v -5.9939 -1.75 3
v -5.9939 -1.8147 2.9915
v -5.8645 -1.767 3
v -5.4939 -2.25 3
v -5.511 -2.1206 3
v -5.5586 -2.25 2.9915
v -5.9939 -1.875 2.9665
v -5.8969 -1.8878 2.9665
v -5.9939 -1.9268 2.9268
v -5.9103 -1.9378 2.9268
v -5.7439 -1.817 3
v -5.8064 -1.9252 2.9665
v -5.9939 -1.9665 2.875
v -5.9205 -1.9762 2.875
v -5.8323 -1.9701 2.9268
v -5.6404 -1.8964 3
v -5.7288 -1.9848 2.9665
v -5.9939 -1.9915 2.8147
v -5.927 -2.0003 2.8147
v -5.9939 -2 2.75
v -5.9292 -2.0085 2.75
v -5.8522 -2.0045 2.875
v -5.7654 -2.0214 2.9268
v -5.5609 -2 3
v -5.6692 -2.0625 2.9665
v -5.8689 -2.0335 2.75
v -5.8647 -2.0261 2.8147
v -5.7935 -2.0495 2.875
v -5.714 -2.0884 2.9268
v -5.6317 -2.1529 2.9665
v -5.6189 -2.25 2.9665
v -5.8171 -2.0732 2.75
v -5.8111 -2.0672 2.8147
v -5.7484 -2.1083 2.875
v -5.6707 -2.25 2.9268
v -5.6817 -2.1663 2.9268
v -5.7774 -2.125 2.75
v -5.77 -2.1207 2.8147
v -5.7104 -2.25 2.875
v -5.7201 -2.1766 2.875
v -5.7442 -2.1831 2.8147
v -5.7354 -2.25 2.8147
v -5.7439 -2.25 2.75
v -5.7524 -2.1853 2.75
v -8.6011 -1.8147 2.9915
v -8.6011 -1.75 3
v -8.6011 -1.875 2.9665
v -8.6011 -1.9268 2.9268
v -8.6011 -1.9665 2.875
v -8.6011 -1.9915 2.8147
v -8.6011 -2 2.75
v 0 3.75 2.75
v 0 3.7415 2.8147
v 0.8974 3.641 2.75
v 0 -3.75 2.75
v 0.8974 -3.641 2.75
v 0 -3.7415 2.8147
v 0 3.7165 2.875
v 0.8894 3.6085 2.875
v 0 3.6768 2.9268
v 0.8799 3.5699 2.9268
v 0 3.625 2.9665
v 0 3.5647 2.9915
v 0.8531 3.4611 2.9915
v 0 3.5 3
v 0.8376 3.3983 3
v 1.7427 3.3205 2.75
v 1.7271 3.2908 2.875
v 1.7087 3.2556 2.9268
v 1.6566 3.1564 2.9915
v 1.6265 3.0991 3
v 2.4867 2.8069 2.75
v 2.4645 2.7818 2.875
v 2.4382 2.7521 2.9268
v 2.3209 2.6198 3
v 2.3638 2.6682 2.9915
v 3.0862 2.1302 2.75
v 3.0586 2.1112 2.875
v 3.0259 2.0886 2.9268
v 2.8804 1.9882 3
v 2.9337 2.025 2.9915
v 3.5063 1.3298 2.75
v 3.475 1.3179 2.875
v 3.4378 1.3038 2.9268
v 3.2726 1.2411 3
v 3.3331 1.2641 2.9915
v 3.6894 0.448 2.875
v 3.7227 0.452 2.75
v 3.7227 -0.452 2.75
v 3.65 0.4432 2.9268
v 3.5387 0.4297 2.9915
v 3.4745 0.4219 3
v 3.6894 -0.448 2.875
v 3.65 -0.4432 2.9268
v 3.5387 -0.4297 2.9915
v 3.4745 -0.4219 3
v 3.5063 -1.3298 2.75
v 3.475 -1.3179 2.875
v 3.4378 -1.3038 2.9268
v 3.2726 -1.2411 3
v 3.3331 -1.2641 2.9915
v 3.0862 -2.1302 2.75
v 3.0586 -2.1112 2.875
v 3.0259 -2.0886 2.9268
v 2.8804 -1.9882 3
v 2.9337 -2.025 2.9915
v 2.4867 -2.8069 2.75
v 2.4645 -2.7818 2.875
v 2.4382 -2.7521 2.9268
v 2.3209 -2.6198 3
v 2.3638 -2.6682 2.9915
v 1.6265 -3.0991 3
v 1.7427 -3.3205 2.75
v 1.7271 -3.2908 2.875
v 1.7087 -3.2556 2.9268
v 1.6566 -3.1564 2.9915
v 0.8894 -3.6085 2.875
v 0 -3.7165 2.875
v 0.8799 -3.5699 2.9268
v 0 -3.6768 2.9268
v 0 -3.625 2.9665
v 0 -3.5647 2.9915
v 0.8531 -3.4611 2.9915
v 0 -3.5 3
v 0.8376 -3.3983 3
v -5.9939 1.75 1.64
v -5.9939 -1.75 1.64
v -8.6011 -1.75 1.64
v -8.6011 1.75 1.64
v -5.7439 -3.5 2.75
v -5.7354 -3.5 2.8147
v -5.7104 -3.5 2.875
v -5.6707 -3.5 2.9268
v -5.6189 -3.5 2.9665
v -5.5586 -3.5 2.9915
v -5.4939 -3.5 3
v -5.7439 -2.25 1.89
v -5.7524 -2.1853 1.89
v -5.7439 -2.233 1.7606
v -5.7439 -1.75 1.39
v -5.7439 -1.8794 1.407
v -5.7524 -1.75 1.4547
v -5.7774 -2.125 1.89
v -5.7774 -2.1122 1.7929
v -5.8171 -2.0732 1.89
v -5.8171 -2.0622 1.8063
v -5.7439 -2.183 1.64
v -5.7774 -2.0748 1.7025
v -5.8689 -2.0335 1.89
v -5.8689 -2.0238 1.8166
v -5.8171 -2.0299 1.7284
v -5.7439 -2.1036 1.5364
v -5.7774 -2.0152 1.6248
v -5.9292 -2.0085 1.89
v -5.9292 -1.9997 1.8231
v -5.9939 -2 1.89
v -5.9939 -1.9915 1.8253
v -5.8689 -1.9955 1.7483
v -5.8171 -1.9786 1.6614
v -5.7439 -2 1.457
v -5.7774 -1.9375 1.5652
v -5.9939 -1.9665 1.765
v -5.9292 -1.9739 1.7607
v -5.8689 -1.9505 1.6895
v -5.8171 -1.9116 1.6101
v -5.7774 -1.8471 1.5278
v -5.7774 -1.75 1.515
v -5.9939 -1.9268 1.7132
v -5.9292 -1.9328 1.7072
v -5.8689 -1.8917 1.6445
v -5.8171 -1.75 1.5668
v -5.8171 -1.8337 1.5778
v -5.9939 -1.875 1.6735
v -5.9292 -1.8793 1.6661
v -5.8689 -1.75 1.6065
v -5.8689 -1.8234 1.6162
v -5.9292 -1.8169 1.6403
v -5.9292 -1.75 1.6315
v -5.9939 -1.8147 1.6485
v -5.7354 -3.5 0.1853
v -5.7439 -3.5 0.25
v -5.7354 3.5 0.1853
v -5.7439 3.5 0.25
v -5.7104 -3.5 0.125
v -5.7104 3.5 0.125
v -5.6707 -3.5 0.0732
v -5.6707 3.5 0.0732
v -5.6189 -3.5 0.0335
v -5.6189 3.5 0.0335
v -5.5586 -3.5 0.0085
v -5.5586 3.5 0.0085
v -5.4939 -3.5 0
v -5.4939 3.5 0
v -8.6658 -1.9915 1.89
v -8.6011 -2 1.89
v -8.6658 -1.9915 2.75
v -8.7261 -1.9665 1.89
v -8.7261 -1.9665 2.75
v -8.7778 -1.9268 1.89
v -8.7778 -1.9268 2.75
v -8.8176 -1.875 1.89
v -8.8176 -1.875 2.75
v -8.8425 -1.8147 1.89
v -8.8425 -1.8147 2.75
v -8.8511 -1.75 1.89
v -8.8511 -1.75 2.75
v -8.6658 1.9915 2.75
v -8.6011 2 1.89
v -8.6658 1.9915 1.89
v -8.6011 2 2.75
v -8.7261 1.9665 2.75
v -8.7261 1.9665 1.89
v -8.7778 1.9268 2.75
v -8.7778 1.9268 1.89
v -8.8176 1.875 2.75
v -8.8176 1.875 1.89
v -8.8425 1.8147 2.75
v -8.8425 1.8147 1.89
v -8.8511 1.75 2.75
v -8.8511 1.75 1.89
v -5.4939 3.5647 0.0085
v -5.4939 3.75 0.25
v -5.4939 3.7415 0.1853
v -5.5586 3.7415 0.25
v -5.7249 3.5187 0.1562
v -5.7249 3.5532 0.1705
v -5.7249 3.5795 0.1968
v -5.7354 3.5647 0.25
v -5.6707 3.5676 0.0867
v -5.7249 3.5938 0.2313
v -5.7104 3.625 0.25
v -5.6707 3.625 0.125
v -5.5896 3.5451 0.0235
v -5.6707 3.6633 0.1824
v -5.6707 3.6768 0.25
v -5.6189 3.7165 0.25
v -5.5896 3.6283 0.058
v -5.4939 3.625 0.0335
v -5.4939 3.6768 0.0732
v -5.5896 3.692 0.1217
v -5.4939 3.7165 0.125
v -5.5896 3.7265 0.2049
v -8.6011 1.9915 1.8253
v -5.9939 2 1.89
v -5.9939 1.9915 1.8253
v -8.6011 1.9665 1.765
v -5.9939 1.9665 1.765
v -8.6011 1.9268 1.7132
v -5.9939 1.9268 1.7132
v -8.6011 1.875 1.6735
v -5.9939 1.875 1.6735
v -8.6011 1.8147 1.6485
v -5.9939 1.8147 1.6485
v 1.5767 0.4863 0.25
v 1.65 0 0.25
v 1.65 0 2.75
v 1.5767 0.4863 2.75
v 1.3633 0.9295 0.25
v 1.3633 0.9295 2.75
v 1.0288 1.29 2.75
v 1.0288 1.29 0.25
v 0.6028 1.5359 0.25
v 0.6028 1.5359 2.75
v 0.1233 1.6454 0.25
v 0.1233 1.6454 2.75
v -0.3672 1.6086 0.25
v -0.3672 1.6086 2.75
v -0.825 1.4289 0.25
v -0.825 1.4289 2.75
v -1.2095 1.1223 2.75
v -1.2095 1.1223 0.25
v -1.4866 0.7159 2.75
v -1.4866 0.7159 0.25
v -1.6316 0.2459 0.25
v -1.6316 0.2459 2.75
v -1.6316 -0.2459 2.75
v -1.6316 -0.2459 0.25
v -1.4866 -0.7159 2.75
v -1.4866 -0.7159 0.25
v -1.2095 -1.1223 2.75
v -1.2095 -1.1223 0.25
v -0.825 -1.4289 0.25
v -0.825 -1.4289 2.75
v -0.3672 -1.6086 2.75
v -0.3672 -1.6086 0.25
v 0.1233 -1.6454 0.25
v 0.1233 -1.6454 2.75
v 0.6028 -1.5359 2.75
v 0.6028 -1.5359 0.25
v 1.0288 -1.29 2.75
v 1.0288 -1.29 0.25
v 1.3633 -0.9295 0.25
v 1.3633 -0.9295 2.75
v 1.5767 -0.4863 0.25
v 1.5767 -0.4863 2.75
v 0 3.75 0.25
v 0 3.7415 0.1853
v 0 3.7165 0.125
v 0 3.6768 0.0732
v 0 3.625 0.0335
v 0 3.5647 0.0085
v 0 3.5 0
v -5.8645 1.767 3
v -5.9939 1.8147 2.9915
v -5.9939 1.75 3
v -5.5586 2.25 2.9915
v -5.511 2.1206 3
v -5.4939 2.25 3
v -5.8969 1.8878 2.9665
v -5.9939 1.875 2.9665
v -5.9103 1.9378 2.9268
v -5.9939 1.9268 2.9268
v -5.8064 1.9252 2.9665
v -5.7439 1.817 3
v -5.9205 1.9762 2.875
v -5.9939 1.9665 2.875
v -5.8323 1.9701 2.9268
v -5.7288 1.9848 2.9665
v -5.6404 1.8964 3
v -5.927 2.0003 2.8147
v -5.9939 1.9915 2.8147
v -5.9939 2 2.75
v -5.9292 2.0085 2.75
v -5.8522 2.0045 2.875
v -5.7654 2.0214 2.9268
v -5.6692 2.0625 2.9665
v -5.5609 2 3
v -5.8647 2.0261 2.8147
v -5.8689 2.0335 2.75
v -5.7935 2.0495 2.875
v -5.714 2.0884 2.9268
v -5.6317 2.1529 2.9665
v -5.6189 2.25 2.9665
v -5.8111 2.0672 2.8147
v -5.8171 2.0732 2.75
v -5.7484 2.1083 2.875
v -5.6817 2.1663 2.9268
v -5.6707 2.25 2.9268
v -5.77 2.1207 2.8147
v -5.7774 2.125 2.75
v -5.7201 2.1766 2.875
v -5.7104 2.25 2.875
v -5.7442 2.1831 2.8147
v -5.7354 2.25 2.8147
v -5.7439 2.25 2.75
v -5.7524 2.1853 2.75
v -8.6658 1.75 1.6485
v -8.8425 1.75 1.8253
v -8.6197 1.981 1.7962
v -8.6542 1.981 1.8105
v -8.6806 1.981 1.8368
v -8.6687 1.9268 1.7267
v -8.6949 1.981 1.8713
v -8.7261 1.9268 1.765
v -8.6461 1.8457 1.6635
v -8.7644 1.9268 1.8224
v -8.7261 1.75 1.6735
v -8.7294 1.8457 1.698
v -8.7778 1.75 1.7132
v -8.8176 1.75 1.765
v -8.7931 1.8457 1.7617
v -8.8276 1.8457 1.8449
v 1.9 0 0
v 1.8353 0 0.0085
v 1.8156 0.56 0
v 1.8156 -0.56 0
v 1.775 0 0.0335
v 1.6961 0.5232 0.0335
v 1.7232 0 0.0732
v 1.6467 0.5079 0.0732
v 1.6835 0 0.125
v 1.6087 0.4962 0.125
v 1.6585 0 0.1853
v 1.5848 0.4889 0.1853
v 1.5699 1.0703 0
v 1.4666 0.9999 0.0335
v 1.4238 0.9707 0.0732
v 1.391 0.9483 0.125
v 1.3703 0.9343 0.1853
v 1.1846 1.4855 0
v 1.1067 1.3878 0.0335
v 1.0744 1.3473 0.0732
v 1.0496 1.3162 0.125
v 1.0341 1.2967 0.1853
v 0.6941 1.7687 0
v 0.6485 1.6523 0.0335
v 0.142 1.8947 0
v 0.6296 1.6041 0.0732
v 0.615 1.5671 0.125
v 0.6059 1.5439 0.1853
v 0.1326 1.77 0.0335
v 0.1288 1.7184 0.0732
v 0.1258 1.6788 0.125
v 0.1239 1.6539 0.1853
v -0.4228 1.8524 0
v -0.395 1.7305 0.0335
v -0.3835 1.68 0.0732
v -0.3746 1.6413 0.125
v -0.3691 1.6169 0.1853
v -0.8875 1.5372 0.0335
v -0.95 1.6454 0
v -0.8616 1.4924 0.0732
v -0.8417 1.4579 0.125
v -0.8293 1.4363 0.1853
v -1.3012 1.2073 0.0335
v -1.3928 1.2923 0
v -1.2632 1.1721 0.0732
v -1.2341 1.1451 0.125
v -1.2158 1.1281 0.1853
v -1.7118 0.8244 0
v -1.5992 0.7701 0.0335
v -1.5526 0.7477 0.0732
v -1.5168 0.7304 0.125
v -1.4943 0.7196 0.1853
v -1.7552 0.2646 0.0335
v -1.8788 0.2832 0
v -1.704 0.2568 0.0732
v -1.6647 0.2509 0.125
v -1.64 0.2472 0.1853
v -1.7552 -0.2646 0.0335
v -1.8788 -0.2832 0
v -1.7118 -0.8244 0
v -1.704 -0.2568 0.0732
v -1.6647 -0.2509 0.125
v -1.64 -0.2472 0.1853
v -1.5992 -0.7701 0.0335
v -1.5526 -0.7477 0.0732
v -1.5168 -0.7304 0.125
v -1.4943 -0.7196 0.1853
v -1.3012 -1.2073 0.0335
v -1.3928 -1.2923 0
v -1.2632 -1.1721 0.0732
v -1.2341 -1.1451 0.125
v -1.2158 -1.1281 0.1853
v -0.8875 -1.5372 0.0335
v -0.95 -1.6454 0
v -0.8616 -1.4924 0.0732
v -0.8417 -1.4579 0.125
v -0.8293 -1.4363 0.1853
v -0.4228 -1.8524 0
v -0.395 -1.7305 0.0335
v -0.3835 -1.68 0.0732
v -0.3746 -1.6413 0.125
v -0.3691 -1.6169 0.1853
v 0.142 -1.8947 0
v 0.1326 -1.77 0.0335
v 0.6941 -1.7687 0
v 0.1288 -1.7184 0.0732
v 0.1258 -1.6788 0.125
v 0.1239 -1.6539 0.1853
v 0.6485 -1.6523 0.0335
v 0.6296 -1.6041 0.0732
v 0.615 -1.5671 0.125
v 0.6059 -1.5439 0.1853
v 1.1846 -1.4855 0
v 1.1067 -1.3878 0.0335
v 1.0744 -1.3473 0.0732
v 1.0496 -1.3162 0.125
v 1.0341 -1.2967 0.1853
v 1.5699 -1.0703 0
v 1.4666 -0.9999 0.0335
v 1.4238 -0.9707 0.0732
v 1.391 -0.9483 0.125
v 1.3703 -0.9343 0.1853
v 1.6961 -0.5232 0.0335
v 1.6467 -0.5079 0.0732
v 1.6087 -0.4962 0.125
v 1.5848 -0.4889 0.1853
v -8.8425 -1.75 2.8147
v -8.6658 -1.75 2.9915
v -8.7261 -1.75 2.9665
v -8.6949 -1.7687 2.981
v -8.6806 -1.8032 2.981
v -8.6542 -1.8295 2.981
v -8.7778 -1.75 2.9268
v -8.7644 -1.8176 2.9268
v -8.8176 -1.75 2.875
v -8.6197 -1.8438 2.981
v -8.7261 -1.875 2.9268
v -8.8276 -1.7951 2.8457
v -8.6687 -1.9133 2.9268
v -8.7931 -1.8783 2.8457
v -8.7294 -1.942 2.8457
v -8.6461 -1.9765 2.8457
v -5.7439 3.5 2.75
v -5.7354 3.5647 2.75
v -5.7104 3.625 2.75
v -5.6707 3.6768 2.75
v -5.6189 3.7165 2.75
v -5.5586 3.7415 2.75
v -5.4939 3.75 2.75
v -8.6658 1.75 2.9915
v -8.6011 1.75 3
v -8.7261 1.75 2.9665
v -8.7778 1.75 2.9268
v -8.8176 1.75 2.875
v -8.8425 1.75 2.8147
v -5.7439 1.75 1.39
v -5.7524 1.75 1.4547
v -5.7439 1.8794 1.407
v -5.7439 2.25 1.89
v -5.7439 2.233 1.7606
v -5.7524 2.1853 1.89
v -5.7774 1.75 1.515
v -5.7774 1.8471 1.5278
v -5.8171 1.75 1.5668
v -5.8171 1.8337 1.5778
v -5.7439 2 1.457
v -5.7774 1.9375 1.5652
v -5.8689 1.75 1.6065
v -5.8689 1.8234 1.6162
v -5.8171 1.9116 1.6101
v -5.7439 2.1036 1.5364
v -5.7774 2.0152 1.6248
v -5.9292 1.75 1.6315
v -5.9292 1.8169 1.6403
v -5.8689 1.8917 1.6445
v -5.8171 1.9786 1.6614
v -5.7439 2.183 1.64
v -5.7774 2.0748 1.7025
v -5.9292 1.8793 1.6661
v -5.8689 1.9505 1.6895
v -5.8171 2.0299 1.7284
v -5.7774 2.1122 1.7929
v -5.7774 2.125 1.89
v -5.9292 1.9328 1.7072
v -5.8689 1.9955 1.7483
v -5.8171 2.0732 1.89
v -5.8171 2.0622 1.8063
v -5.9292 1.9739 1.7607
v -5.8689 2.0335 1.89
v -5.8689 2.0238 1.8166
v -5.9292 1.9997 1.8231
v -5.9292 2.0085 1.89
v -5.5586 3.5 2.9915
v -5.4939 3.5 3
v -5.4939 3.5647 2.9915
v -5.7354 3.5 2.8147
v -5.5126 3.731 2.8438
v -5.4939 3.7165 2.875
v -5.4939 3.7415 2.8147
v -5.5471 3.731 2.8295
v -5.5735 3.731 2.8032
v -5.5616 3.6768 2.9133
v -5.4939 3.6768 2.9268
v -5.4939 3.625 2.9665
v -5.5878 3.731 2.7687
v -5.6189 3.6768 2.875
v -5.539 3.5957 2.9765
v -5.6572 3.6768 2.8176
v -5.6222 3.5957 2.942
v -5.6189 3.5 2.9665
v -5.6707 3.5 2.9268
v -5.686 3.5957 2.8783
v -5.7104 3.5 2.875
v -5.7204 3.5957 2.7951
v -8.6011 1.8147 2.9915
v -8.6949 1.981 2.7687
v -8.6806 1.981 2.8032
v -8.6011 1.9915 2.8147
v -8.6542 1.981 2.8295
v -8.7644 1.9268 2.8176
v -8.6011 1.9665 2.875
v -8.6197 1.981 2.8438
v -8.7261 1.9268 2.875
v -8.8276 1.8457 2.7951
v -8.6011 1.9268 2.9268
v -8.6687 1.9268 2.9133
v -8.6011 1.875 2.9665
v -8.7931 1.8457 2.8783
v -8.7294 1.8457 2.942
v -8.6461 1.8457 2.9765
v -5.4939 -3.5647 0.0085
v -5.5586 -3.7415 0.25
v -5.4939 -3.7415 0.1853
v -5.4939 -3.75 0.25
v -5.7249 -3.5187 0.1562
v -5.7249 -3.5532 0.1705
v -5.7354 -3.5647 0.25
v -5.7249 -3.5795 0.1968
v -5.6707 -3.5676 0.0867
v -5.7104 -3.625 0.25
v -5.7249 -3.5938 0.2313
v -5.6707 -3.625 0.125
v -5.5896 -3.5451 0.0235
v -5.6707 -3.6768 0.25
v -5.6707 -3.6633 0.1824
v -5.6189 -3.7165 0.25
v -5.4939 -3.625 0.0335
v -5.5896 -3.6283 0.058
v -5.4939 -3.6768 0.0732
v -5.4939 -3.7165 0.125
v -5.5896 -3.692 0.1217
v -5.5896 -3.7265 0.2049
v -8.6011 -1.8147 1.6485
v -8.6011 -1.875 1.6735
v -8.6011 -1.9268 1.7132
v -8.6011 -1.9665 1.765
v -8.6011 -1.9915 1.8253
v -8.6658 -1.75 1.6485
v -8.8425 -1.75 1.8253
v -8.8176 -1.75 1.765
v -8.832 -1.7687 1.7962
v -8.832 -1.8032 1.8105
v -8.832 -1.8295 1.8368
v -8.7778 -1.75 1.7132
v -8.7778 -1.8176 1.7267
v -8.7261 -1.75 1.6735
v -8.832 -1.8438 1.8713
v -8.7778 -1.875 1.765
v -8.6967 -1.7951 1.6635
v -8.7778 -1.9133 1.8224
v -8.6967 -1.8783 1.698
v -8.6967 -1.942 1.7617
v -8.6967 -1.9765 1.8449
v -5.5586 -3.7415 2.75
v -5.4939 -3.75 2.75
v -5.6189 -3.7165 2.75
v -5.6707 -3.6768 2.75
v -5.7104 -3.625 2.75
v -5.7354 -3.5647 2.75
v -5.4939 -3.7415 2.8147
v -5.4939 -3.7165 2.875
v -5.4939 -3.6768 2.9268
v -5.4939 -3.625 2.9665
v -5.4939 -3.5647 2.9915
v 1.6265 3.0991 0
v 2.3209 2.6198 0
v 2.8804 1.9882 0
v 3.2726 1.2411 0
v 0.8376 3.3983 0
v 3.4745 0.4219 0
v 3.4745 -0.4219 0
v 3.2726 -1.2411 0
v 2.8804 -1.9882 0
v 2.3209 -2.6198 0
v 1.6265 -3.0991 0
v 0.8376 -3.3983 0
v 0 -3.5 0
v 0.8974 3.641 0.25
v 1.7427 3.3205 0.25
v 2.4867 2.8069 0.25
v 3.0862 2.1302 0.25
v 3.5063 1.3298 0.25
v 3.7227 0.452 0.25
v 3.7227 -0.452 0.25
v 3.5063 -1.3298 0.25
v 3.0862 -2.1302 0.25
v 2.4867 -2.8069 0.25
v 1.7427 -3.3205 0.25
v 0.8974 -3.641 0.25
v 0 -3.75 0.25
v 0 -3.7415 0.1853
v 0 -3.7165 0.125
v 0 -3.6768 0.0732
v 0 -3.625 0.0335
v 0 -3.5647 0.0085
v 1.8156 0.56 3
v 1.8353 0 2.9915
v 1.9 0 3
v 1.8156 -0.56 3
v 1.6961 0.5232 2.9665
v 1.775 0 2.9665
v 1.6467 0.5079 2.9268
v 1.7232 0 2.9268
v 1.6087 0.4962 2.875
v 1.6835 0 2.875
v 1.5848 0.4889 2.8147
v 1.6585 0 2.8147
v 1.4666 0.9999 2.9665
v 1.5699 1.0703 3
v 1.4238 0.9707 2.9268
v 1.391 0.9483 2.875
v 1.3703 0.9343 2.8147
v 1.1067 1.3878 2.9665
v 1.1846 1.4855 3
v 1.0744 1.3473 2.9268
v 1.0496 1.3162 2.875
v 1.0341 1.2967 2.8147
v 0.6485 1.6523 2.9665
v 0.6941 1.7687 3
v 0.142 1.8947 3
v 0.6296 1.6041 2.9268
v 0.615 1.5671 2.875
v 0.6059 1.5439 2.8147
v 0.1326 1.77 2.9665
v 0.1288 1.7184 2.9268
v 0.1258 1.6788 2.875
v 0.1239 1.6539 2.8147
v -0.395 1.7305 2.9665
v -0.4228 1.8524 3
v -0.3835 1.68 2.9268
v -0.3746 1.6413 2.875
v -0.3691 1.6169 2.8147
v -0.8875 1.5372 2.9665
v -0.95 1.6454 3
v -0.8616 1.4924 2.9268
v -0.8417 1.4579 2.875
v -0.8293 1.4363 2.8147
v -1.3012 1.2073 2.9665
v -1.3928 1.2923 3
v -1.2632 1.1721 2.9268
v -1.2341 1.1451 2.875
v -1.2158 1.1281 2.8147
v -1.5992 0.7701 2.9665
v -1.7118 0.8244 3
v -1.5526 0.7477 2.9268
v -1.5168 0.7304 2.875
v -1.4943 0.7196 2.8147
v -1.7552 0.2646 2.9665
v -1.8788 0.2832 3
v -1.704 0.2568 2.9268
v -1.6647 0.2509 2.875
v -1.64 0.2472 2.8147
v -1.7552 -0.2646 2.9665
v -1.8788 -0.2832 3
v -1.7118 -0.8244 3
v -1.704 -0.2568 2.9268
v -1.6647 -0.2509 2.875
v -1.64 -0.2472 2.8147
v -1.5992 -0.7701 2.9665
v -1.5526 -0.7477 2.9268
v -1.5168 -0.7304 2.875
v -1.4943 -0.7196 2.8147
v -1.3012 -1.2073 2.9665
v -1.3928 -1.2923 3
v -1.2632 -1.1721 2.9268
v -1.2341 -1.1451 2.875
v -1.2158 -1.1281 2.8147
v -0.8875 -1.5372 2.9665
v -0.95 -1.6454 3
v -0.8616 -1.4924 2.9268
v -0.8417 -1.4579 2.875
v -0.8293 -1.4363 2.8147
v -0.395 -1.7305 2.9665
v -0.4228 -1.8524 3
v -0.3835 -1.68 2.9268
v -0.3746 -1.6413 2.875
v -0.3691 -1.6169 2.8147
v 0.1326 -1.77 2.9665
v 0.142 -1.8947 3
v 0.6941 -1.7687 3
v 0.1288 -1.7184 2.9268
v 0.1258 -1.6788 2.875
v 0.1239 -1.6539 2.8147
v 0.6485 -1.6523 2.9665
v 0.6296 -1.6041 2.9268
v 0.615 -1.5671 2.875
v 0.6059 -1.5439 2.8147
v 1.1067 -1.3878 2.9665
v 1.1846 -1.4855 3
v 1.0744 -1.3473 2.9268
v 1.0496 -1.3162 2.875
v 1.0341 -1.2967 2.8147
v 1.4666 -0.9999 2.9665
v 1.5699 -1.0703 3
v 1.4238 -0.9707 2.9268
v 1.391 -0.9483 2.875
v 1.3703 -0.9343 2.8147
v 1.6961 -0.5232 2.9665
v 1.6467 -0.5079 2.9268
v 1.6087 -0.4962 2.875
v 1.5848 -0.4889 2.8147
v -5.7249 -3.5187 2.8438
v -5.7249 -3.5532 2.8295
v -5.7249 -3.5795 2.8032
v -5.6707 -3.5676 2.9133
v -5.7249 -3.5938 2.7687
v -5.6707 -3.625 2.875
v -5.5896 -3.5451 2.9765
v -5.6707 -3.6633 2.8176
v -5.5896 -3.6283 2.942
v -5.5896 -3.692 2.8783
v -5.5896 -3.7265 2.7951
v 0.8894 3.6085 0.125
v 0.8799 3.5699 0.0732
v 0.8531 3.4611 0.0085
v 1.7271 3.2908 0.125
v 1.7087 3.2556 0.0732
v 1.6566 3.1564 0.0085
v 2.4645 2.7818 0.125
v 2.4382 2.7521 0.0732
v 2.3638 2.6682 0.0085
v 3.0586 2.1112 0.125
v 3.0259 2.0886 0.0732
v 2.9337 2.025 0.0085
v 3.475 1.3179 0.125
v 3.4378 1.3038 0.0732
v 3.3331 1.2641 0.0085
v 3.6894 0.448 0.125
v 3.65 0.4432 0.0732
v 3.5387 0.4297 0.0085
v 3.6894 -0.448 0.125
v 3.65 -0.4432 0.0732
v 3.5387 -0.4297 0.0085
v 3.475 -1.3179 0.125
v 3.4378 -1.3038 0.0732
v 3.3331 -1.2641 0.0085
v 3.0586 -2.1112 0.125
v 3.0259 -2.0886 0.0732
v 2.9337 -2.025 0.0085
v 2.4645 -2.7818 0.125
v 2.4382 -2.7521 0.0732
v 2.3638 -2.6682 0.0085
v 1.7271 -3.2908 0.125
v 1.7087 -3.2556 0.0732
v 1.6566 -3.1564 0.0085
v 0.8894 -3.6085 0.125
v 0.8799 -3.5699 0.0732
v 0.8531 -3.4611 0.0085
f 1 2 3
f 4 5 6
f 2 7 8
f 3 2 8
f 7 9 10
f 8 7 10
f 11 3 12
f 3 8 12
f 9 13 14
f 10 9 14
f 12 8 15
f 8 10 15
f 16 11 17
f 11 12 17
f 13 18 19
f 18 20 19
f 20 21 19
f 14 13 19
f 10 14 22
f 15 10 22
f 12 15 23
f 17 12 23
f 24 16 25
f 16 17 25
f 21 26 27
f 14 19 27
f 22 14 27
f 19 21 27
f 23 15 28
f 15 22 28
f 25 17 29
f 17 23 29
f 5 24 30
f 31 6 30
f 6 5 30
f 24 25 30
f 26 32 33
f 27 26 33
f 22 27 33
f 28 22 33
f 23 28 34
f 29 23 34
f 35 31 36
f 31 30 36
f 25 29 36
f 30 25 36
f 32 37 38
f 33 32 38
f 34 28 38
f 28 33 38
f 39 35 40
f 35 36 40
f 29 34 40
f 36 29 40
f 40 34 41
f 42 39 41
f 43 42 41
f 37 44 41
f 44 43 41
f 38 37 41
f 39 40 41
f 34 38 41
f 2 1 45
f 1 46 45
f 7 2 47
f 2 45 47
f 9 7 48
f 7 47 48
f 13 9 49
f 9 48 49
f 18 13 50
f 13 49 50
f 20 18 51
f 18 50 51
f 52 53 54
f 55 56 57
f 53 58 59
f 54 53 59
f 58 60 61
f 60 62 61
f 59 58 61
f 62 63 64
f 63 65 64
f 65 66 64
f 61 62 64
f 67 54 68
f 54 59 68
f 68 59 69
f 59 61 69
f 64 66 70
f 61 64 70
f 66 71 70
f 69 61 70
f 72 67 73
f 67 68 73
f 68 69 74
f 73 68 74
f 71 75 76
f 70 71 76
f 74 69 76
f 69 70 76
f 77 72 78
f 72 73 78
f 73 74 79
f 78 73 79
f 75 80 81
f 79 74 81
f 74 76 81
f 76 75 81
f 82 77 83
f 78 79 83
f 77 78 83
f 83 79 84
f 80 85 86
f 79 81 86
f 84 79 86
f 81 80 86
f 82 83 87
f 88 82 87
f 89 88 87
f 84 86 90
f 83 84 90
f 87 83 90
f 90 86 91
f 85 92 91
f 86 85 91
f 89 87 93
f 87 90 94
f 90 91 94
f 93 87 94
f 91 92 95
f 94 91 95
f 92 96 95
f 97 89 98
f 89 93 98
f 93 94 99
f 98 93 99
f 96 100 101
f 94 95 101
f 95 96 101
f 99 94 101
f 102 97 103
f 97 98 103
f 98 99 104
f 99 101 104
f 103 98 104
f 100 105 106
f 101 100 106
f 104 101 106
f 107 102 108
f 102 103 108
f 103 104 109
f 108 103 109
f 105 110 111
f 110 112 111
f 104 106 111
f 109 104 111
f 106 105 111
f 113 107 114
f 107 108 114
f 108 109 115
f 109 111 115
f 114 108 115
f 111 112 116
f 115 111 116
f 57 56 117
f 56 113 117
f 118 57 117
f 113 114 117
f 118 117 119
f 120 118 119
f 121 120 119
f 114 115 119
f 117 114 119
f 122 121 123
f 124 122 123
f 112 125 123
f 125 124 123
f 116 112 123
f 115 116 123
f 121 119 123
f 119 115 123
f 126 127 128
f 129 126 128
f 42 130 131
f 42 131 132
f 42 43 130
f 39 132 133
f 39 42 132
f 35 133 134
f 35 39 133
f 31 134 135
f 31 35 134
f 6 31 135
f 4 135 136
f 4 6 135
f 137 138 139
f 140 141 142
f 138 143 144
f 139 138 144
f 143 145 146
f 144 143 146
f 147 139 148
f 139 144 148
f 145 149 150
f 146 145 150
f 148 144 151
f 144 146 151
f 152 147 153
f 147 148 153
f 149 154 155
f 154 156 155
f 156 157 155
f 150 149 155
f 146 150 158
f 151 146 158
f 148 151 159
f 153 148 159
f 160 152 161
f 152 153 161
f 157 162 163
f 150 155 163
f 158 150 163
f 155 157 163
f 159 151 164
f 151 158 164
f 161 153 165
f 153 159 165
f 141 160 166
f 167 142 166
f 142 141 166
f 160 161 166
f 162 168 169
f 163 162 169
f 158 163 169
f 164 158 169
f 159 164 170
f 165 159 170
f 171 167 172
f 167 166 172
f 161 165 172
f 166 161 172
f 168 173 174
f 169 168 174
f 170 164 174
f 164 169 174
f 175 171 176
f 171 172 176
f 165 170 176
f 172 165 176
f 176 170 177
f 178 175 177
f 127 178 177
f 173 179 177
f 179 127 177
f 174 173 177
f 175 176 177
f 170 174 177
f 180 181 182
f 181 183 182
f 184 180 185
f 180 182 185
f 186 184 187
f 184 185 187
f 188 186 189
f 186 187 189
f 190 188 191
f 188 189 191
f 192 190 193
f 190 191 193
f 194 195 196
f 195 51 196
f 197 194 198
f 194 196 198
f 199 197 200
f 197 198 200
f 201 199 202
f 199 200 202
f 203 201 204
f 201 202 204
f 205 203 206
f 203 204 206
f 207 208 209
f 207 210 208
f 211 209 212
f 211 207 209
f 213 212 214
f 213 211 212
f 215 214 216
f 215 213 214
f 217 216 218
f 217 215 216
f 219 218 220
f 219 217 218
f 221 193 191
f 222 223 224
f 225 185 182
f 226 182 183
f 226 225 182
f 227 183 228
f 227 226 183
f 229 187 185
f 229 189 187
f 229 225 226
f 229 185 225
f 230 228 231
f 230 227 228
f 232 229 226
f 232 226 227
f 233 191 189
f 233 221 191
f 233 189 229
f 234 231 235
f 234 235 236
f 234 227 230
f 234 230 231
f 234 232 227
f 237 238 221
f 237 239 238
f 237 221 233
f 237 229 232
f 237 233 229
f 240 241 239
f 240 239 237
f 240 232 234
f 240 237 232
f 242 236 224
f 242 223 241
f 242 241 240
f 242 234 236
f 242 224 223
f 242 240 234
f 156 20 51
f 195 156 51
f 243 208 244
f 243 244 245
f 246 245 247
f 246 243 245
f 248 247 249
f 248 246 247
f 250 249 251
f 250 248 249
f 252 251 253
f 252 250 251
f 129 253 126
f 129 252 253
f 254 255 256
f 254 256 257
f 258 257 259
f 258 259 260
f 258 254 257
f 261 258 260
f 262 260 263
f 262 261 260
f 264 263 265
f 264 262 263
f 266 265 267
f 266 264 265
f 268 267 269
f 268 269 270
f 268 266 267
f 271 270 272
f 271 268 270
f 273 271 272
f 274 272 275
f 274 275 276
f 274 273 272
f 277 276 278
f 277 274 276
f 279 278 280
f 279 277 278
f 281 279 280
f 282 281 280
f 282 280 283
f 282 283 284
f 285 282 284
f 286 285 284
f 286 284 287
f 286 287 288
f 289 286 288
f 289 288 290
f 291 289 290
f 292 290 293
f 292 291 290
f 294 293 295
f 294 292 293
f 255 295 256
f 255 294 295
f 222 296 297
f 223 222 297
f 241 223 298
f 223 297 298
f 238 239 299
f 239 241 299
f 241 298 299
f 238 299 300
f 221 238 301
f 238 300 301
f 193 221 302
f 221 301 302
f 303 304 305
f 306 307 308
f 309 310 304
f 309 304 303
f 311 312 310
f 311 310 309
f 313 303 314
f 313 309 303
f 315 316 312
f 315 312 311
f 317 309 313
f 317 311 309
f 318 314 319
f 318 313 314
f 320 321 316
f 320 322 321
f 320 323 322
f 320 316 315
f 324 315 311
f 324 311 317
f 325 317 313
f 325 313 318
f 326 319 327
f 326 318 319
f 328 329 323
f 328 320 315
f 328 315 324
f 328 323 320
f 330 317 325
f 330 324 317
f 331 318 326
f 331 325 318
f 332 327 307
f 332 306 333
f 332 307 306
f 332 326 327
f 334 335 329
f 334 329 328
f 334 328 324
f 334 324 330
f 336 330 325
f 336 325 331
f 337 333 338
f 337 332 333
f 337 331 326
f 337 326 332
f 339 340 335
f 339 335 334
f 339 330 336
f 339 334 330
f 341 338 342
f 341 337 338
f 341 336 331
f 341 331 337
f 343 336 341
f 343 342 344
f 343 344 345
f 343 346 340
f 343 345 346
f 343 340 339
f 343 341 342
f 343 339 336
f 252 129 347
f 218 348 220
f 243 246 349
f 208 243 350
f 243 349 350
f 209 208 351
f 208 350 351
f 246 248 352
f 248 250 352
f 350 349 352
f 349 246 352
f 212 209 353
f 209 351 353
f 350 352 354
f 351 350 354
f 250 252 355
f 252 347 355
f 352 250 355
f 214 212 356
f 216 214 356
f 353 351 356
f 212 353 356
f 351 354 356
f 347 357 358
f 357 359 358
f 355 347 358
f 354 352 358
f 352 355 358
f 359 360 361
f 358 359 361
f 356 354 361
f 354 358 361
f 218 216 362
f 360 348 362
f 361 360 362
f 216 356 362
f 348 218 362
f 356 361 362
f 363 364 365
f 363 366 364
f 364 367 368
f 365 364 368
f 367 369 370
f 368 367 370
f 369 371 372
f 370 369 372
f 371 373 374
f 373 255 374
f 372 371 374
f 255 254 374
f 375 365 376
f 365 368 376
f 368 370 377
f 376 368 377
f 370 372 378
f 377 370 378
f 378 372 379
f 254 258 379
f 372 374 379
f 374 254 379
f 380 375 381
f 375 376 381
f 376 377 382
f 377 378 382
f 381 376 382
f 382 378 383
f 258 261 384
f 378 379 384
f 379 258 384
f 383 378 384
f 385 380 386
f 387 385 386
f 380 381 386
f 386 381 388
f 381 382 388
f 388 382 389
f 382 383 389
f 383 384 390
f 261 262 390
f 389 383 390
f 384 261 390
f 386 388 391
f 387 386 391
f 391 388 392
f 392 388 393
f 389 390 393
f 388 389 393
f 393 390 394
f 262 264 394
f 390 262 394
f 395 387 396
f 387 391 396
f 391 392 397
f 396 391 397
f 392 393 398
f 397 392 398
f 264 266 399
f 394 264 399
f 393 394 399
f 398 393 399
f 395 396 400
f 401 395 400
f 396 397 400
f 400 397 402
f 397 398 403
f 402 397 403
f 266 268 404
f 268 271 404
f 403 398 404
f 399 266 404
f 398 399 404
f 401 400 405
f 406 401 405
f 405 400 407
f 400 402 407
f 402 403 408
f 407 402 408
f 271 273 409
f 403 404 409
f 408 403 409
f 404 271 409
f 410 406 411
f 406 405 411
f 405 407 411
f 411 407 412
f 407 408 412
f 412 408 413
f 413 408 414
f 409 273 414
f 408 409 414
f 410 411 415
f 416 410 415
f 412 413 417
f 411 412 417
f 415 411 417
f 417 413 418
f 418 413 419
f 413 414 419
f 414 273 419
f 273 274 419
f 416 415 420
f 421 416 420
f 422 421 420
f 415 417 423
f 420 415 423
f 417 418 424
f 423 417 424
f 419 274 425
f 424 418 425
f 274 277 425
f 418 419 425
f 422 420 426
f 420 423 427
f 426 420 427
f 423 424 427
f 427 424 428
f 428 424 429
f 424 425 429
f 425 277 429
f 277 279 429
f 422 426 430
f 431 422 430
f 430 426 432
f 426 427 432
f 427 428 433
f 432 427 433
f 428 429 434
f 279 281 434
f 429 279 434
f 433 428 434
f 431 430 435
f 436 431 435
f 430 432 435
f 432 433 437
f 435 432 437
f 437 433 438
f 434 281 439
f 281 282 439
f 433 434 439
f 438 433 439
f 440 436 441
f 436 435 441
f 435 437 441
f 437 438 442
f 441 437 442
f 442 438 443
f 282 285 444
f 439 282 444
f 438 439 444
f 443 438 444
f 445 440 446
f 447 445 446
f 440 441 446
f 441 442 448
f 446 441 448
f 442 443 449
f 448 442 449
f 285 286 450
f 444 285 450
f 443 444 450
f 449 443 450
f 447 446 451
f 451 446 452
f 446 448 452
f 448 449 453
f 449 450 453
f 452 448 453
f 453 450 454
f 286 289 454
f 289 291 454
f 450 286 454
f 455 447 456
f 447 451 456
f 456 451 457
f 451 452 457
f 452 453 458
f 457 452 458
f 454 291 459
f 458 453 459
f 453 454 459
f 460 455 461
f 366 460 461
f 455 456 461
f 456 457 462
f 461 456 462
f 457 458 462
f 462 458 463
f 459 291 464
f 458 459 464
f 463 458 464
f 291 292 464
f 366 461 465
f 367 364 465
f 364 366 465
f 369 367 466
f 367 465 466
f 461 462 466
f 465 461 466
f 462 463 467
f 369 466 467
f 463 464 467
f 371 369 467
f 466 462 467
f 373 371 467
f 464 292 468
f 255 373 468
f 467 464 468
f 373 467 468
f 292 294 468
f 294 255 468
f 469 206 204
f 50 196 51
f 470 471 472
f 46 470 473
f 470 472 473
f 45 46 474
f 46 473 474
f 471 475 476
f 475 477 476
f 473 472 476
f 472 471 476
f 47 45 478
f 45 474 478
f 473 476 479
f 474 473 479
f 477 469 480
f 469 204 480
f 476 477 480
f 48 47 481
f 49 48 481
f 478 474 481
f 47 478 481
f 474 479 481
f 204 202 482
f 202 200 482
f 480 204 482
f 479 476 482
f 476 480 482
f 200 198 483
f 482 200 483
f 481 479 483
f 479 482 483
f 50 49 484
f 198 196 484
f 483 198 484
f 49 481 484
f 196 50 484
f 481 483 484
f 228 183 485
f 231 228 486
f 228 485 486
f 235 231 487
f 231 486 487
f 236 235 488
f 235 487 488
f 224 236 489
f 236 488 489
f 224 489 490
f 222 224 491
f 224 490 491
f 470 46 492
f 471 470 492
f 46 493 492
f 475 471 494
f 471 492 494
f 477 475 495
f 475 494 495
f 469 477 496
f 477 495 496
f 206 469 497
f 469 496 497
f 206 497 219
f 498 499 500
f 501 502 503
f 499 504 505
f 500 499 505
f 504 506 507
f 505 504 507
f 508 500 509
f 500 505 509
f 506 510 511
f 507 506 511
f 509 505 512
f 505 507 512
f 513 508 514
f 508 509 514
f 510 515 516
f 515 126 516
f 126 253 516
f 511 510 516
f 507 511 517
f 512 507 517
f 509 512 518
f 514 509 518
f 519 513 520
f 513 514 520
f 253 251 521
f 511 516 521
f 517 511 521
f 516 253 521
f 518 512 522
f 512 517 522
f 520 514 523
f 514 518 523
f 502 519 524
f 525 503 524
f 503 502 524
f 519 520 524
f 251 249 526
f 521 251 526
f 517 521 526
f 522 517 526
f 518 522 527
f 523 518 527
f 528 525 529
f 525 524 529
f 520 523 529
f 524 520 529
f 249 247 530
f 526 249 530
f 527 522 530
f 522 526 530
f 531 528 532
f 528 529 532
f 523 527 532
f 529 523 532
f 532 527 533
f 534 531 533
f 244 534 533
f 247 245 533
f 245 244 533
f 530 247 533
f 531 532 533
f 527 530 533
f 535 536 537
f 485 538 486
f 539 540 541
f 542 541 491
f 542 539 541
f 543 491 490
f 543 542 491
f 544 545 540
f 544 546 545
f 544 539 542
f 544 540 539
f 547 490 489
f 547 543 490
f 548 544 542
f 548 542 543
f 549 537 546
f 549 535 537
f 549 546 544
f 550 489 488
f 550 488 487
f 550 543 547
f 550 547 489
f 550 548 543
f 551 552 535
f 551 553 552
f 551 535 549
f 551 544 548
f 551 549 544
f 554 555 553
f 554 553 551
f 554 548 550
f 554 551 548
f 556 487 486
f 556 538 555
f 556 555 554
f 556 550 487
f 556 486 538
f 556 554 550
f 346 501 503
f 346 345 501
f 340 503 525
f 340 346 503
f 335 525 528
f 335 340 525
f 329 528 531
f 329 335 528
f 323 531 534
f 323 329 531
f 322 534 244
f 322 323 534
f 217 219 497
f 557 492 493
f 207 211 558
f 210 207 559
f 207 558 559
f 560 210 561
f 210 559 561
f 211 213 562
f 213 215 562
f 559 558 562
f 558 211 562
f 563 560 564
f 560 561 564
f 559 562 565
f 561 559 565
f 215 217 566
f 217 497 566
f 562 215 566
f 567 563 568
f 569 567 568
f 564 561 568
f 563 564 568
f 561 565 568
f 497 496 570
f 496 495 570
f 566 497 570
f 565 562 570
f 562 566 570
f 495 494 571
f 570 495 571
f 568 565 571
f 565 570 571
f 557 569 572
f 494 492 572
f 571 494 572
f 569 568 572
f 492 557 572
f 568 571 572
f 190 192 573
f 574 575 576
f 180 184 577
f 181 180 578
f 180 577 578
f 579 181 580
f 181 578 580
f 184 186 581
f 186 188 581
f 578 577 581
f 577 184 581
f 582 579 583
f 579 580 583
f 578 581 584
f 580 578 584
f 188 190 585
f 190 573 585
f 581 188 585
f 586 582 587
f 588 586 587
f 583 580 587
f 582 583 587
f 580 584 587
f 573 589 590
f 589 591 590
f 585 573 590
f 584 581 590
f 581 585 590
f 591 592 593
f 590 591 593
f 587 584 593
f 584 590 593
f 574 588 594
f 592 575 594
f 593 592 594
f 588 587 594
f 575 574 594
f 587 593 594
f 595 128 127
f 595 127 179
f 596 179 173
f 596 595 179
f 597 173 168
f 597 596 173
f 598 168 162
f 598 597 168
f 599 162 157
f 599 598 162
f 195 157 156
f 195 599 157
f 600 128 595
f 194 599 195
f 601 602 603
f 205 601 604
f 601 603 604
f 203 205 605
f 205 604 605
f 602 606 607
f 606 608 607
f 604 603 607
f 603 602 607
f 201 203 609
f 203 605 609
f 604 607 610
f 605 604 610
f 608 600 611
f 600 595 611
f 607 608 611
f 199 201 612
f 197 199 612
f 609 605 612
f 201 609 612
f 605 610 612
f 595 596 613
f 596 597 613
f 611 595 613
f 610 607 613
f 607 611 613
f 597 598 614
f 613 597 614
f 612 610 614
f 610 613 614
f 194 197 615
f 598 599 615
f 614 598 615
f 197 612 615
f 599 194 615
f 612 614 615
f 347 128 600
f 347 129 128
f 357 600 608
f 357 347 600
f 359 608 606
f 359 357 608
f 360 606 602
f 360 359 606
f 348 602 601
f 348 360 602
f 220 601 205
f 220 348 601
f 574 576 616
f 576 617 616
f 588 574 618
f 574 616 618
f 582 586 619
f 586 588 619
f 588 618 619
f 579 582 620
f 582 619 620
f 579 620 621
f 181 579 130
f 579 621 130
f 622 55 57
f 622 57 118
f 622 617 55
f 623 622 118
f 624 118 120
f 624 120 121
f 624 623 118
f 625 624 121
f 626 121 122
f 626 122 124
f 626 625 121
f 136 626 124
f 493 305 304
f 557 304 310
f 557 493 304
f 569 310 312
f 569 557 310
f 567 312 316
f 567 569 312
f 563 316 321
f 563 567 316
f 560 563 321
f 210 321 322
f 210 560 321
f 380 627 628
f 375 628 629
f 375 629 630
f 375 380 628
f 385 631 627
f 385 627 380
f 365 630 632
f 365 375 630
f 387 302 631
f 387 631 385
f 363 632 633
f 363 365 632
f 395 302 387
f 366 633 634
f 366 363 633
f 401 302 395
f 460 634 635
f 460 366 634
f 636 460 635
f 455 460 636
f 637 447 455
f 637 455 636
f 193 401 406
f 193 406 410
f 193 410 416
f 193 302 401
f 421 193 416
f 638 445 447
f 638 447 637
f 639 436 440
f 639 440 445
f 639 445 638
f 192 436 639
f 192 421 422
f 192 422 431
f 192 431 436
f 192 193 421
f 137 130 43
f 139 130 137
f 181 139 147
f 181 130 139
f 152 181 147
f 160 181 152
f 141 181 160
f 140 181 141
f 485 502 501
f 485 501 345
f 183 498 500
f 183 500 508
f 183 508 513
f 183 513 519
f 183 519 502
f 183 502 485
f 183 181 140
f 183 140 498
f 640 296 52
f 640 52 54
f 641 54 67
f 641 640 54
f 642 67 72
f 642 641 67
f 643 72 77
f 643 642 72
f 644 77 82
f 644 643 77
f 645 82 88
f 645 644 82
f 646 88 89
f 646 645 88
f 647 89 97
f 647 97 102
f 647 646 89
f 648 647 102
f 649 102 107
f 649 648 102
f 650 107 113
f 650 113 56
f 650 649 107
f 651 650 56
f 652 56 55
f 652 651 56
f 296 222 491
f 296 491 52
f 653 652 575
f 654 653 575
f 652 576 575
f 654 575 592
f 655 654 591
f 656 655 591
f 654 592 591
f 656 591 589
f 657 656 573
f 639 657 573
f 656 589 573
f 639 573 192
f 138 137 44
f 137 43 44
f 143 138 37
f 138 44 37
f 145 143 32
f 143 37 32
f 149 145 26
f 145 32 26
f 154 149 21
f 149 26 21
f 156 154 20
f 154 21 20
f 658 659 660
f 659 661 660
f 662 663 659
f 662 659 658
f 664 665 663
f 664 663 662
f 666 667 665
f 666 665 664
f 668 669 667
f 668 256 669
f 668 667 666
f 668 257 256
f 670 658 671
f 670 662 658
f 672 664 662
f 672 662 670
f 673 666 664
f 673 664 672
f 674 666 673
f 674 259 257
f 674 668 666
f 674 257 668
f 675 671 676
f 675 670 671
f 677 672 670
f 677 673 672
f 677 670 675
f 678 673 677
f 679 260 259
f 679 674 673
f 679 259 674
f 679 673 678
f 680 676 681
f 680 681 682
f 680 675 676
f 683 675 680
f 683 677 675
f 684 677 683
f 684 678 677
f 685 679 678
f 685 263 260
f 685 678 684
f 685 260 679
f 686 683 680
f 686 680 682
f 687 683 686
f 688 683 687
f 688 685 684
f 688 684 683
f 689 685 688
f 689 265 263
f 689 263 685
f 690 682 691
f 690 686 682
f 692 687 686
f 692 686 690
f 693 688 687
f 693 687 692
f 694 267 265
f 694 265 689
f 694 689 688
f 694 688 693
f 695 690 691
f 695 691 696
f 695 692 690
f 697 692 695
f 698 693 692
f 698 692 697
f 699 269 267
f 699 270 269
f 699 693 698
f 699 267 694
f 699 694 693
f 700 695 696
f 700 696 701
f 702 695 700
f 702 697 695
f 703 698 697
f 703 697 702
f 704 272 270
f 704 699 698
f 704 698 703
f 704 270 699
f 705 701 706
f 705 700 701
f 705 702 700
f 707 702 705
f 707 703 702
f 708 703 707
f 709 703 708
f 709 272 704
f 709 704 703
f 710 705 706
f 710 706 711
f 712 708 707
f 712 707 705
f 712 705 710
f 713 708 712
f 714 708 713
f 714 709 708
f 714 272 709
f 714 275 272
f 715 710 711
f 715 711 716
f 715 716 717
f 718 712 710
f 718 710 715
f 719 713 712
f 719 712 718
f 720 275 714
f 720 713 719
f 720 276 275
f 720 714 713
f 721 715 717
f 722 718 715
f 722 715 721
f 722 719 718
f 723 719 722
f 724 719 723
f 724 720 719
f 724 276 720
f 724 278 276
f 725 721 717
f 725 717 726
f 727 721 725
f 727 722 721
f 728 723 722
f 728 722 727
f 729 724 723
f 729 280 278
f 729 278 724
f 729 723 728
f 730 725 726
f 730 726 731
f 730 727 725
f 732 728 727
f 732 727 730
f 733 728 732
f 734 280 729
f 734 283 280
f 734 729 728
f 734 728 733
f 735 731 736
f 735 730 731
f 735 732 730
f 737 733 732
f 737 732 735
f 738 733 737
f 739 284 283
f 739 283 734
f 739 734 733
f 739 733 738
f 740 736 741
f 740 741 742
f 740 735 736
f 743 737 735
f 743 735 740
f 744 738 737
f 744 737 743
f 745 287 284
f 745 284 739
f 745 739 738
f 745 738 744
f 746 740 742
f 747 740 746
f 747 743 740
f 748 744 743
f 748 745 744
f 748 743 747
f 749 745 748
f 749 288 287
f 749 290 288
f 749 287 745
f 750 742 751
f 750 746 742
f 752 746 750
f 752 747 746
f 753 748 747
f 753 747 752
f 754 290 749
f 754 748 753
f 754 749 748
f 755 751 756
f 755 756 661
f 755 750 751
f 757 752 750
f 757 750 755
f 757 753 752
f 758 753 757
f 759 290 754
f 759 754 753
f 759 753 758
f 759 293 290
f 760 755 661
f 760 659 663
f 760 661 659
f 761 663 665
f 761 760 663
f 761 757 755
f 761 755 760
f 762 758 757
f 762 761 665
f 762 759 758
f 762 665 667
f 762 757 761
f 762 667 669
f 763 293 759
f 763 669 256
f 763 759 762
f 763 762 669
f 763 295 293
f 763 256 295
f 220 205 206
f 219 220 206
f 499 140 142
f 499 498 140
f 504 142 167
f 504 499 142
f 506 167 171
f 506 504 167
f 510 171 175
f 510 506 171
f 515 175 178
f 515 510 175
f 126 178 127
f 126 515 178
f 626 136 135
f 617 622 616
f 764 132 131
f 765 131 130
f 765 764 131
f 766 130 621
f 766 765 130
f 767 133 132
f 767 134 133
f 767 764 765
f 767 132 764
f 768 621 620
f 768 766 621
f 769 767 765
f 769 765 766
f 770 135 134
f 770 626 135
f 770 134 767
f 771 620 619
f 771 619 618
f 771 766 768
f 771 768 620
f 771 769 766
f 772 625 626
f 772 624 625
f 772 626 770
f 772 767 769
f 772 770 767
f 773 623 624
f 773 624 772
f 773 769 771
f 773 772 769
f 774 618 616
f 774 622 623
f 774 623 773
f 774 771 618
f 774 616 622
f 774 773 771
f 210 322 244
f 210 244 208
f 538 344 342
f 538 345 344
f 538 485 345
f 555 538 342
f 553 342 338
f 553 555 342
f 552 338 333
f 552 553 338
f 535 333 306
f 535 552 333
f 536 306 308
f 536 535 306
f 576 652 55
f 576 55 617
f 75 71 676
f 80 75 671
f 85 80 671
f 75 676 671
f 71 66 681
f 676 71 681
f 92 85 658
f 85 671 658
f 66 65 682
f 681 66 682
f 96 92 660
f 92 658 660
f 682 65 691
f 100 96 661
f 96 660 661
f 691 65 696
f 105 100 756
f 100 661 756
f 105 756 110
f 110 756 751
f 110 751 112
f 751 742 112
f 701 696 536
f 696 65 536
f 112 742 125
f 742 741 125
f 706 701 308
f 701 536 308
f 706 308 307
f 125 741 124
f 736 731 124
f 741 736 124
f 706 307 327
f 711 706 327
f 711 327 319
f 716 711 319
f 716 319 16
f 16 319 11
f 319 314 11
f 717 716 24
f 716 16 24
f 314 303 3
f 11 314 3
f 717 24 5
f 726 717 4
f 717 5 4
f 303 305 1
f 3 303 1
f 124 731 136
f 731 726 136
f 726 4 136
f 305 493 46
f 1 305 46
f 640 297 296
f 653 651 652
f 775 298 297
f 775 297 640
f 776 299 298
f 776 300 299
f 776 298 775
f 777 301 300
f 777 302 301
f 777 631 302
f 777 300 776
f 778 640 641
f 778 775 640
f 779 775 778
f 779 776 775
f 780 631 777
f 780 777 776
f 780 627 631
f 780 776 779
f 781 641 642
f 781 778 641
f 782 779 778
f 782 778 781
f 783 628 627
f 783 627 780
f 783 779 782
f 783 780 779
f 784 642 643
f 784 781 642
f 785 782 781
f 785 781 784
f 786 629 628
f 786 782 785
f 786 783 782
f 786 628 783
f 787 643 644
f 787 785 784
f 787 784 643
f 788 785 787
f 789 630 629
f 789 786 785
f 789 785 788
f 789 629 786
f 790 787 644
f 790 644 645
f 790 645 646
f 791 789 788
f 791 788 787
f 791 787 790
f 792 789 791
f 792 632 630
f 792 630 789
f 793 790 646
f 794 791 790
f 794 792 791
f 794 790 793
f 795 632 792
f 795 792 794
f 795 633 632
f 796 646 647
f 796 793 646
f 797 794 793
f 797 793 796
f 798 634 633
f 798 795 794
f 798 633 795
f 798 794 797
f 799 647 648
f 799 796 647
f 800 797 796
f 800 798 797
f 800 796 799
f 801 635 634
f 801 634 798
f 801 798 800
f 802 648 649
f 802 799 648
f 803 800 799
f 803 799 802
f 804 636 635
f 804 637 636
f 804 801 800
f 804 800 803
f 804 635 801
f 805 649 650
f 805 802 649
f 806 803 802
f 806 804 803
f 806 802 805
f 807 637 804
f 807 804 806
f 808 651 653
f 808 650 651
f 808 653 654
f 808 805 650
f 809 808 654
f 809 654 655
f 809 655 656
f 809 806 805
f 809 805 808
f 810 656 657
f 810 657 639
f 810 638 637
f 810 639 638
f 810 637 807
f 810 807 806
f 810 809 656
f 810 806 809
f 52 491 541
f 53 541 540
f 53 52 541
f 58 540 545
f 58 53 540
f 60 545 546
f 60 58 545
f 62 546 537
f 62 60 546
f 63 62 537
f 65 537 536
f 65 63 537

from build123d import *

# Parameters (mm, degrees)
SKETCH1_R                = 1.65
BOSS_EXTRUDE1_DEPTH      = 3
BOSS_EXTRUDE2_DEPTH      = 2
BOSS_EXTRUDE2_DEPTH_BACK = 2
SKETCH2_W                = 3.107139826
SKETCH2_H                = 1.36
FILLET1_R                = 0.25


with BuildPart() as part:
    # Sketch1 → Boss-Extrude1 (new body)
    with BuildSketch(Plane(origin=(0, 0, 0), x_dir=(0, 1, 0), z_dir=(0, 0, 1))):
        with BuildLine():
            Line((-3.75, 0), (-3.75, 5.743917642))
            Line((-3.75, 5.743917642), (3.75, 5.743917642))
            Line((3.75, 5.743917642), (3.75, 0))
            ThreePointArc((3.75, 0), (0, -3.75), (-3.75, 0))
        make_face()
        with Locations(Location((0, 0, 0), (0, 0, 270))):
            Circle(SKETCH1_R, mode=Mode.SUBTRACT)
    extrude(amount=BOSS_EXTRUDE1_DEPTH)

    # Sketch2 → Boss-Extrude2 (add, two sides: drawn at the far end of the back side and taken through both)
    with BuildSketch(Plane(origin=(0, 0, 0), x_dir=(-1, 0, 0), z_dir=(0, 1, 0)).offset(-BOSS_EXTRUDE2_DEPTH_BACK)):
        with Locations((7.297487555, 2.32)):
            Rectangle(SKETCH2_W, SKETCH2_H)
    extrude(amount=BOSS_EXTRUDE2_DEPTH + BOSS_EXTRUDE2_DEPTH_BACK)

    # Fillet1
    fillet1_edges = [part.edges().sort_by_distance(p)[0] for p in [
        (-1.65, 0, 0),
        (-1.65, 0, 3),
        (-5.743917642, 2.875, 3),
        (-2.871958821, -3.75, 3),
        (-5.743917642, -2.875, 3),
        (-5.743917642, -2, 2.32),
        (-5.743917642, 0, 1.64),
        (-7.297487555, -2, 1.64),
        (-8.851057468, 0, 1.64),
        (-8.851057468, -2, 2.32),
        (-8.851057468, 0, 3),
        (-7.297487555, -2, 3),
        (-5.743917642, 2, 2.32),
        (-7.297487555, 2, 1.64),
        (-8.851057468, 2, 2.32),
        (-7.297487555, 2, 3),
        (3.75, 0, 3),
        (-2.871958821, -3.75, 0),
        (-5.743917642, 0, 0),
        (-2.871958821, 3.75, 0),
        (3.75, 0, 0),
        (-5.743917642, -3.75, 1.5),
        (-5.743917642, 3.75, 1.5),
        (-2.871958821, 3.75, 3),
    ]]
    fillet(fillet1_edges, radius=FILLET1_R)


solid = part.part
